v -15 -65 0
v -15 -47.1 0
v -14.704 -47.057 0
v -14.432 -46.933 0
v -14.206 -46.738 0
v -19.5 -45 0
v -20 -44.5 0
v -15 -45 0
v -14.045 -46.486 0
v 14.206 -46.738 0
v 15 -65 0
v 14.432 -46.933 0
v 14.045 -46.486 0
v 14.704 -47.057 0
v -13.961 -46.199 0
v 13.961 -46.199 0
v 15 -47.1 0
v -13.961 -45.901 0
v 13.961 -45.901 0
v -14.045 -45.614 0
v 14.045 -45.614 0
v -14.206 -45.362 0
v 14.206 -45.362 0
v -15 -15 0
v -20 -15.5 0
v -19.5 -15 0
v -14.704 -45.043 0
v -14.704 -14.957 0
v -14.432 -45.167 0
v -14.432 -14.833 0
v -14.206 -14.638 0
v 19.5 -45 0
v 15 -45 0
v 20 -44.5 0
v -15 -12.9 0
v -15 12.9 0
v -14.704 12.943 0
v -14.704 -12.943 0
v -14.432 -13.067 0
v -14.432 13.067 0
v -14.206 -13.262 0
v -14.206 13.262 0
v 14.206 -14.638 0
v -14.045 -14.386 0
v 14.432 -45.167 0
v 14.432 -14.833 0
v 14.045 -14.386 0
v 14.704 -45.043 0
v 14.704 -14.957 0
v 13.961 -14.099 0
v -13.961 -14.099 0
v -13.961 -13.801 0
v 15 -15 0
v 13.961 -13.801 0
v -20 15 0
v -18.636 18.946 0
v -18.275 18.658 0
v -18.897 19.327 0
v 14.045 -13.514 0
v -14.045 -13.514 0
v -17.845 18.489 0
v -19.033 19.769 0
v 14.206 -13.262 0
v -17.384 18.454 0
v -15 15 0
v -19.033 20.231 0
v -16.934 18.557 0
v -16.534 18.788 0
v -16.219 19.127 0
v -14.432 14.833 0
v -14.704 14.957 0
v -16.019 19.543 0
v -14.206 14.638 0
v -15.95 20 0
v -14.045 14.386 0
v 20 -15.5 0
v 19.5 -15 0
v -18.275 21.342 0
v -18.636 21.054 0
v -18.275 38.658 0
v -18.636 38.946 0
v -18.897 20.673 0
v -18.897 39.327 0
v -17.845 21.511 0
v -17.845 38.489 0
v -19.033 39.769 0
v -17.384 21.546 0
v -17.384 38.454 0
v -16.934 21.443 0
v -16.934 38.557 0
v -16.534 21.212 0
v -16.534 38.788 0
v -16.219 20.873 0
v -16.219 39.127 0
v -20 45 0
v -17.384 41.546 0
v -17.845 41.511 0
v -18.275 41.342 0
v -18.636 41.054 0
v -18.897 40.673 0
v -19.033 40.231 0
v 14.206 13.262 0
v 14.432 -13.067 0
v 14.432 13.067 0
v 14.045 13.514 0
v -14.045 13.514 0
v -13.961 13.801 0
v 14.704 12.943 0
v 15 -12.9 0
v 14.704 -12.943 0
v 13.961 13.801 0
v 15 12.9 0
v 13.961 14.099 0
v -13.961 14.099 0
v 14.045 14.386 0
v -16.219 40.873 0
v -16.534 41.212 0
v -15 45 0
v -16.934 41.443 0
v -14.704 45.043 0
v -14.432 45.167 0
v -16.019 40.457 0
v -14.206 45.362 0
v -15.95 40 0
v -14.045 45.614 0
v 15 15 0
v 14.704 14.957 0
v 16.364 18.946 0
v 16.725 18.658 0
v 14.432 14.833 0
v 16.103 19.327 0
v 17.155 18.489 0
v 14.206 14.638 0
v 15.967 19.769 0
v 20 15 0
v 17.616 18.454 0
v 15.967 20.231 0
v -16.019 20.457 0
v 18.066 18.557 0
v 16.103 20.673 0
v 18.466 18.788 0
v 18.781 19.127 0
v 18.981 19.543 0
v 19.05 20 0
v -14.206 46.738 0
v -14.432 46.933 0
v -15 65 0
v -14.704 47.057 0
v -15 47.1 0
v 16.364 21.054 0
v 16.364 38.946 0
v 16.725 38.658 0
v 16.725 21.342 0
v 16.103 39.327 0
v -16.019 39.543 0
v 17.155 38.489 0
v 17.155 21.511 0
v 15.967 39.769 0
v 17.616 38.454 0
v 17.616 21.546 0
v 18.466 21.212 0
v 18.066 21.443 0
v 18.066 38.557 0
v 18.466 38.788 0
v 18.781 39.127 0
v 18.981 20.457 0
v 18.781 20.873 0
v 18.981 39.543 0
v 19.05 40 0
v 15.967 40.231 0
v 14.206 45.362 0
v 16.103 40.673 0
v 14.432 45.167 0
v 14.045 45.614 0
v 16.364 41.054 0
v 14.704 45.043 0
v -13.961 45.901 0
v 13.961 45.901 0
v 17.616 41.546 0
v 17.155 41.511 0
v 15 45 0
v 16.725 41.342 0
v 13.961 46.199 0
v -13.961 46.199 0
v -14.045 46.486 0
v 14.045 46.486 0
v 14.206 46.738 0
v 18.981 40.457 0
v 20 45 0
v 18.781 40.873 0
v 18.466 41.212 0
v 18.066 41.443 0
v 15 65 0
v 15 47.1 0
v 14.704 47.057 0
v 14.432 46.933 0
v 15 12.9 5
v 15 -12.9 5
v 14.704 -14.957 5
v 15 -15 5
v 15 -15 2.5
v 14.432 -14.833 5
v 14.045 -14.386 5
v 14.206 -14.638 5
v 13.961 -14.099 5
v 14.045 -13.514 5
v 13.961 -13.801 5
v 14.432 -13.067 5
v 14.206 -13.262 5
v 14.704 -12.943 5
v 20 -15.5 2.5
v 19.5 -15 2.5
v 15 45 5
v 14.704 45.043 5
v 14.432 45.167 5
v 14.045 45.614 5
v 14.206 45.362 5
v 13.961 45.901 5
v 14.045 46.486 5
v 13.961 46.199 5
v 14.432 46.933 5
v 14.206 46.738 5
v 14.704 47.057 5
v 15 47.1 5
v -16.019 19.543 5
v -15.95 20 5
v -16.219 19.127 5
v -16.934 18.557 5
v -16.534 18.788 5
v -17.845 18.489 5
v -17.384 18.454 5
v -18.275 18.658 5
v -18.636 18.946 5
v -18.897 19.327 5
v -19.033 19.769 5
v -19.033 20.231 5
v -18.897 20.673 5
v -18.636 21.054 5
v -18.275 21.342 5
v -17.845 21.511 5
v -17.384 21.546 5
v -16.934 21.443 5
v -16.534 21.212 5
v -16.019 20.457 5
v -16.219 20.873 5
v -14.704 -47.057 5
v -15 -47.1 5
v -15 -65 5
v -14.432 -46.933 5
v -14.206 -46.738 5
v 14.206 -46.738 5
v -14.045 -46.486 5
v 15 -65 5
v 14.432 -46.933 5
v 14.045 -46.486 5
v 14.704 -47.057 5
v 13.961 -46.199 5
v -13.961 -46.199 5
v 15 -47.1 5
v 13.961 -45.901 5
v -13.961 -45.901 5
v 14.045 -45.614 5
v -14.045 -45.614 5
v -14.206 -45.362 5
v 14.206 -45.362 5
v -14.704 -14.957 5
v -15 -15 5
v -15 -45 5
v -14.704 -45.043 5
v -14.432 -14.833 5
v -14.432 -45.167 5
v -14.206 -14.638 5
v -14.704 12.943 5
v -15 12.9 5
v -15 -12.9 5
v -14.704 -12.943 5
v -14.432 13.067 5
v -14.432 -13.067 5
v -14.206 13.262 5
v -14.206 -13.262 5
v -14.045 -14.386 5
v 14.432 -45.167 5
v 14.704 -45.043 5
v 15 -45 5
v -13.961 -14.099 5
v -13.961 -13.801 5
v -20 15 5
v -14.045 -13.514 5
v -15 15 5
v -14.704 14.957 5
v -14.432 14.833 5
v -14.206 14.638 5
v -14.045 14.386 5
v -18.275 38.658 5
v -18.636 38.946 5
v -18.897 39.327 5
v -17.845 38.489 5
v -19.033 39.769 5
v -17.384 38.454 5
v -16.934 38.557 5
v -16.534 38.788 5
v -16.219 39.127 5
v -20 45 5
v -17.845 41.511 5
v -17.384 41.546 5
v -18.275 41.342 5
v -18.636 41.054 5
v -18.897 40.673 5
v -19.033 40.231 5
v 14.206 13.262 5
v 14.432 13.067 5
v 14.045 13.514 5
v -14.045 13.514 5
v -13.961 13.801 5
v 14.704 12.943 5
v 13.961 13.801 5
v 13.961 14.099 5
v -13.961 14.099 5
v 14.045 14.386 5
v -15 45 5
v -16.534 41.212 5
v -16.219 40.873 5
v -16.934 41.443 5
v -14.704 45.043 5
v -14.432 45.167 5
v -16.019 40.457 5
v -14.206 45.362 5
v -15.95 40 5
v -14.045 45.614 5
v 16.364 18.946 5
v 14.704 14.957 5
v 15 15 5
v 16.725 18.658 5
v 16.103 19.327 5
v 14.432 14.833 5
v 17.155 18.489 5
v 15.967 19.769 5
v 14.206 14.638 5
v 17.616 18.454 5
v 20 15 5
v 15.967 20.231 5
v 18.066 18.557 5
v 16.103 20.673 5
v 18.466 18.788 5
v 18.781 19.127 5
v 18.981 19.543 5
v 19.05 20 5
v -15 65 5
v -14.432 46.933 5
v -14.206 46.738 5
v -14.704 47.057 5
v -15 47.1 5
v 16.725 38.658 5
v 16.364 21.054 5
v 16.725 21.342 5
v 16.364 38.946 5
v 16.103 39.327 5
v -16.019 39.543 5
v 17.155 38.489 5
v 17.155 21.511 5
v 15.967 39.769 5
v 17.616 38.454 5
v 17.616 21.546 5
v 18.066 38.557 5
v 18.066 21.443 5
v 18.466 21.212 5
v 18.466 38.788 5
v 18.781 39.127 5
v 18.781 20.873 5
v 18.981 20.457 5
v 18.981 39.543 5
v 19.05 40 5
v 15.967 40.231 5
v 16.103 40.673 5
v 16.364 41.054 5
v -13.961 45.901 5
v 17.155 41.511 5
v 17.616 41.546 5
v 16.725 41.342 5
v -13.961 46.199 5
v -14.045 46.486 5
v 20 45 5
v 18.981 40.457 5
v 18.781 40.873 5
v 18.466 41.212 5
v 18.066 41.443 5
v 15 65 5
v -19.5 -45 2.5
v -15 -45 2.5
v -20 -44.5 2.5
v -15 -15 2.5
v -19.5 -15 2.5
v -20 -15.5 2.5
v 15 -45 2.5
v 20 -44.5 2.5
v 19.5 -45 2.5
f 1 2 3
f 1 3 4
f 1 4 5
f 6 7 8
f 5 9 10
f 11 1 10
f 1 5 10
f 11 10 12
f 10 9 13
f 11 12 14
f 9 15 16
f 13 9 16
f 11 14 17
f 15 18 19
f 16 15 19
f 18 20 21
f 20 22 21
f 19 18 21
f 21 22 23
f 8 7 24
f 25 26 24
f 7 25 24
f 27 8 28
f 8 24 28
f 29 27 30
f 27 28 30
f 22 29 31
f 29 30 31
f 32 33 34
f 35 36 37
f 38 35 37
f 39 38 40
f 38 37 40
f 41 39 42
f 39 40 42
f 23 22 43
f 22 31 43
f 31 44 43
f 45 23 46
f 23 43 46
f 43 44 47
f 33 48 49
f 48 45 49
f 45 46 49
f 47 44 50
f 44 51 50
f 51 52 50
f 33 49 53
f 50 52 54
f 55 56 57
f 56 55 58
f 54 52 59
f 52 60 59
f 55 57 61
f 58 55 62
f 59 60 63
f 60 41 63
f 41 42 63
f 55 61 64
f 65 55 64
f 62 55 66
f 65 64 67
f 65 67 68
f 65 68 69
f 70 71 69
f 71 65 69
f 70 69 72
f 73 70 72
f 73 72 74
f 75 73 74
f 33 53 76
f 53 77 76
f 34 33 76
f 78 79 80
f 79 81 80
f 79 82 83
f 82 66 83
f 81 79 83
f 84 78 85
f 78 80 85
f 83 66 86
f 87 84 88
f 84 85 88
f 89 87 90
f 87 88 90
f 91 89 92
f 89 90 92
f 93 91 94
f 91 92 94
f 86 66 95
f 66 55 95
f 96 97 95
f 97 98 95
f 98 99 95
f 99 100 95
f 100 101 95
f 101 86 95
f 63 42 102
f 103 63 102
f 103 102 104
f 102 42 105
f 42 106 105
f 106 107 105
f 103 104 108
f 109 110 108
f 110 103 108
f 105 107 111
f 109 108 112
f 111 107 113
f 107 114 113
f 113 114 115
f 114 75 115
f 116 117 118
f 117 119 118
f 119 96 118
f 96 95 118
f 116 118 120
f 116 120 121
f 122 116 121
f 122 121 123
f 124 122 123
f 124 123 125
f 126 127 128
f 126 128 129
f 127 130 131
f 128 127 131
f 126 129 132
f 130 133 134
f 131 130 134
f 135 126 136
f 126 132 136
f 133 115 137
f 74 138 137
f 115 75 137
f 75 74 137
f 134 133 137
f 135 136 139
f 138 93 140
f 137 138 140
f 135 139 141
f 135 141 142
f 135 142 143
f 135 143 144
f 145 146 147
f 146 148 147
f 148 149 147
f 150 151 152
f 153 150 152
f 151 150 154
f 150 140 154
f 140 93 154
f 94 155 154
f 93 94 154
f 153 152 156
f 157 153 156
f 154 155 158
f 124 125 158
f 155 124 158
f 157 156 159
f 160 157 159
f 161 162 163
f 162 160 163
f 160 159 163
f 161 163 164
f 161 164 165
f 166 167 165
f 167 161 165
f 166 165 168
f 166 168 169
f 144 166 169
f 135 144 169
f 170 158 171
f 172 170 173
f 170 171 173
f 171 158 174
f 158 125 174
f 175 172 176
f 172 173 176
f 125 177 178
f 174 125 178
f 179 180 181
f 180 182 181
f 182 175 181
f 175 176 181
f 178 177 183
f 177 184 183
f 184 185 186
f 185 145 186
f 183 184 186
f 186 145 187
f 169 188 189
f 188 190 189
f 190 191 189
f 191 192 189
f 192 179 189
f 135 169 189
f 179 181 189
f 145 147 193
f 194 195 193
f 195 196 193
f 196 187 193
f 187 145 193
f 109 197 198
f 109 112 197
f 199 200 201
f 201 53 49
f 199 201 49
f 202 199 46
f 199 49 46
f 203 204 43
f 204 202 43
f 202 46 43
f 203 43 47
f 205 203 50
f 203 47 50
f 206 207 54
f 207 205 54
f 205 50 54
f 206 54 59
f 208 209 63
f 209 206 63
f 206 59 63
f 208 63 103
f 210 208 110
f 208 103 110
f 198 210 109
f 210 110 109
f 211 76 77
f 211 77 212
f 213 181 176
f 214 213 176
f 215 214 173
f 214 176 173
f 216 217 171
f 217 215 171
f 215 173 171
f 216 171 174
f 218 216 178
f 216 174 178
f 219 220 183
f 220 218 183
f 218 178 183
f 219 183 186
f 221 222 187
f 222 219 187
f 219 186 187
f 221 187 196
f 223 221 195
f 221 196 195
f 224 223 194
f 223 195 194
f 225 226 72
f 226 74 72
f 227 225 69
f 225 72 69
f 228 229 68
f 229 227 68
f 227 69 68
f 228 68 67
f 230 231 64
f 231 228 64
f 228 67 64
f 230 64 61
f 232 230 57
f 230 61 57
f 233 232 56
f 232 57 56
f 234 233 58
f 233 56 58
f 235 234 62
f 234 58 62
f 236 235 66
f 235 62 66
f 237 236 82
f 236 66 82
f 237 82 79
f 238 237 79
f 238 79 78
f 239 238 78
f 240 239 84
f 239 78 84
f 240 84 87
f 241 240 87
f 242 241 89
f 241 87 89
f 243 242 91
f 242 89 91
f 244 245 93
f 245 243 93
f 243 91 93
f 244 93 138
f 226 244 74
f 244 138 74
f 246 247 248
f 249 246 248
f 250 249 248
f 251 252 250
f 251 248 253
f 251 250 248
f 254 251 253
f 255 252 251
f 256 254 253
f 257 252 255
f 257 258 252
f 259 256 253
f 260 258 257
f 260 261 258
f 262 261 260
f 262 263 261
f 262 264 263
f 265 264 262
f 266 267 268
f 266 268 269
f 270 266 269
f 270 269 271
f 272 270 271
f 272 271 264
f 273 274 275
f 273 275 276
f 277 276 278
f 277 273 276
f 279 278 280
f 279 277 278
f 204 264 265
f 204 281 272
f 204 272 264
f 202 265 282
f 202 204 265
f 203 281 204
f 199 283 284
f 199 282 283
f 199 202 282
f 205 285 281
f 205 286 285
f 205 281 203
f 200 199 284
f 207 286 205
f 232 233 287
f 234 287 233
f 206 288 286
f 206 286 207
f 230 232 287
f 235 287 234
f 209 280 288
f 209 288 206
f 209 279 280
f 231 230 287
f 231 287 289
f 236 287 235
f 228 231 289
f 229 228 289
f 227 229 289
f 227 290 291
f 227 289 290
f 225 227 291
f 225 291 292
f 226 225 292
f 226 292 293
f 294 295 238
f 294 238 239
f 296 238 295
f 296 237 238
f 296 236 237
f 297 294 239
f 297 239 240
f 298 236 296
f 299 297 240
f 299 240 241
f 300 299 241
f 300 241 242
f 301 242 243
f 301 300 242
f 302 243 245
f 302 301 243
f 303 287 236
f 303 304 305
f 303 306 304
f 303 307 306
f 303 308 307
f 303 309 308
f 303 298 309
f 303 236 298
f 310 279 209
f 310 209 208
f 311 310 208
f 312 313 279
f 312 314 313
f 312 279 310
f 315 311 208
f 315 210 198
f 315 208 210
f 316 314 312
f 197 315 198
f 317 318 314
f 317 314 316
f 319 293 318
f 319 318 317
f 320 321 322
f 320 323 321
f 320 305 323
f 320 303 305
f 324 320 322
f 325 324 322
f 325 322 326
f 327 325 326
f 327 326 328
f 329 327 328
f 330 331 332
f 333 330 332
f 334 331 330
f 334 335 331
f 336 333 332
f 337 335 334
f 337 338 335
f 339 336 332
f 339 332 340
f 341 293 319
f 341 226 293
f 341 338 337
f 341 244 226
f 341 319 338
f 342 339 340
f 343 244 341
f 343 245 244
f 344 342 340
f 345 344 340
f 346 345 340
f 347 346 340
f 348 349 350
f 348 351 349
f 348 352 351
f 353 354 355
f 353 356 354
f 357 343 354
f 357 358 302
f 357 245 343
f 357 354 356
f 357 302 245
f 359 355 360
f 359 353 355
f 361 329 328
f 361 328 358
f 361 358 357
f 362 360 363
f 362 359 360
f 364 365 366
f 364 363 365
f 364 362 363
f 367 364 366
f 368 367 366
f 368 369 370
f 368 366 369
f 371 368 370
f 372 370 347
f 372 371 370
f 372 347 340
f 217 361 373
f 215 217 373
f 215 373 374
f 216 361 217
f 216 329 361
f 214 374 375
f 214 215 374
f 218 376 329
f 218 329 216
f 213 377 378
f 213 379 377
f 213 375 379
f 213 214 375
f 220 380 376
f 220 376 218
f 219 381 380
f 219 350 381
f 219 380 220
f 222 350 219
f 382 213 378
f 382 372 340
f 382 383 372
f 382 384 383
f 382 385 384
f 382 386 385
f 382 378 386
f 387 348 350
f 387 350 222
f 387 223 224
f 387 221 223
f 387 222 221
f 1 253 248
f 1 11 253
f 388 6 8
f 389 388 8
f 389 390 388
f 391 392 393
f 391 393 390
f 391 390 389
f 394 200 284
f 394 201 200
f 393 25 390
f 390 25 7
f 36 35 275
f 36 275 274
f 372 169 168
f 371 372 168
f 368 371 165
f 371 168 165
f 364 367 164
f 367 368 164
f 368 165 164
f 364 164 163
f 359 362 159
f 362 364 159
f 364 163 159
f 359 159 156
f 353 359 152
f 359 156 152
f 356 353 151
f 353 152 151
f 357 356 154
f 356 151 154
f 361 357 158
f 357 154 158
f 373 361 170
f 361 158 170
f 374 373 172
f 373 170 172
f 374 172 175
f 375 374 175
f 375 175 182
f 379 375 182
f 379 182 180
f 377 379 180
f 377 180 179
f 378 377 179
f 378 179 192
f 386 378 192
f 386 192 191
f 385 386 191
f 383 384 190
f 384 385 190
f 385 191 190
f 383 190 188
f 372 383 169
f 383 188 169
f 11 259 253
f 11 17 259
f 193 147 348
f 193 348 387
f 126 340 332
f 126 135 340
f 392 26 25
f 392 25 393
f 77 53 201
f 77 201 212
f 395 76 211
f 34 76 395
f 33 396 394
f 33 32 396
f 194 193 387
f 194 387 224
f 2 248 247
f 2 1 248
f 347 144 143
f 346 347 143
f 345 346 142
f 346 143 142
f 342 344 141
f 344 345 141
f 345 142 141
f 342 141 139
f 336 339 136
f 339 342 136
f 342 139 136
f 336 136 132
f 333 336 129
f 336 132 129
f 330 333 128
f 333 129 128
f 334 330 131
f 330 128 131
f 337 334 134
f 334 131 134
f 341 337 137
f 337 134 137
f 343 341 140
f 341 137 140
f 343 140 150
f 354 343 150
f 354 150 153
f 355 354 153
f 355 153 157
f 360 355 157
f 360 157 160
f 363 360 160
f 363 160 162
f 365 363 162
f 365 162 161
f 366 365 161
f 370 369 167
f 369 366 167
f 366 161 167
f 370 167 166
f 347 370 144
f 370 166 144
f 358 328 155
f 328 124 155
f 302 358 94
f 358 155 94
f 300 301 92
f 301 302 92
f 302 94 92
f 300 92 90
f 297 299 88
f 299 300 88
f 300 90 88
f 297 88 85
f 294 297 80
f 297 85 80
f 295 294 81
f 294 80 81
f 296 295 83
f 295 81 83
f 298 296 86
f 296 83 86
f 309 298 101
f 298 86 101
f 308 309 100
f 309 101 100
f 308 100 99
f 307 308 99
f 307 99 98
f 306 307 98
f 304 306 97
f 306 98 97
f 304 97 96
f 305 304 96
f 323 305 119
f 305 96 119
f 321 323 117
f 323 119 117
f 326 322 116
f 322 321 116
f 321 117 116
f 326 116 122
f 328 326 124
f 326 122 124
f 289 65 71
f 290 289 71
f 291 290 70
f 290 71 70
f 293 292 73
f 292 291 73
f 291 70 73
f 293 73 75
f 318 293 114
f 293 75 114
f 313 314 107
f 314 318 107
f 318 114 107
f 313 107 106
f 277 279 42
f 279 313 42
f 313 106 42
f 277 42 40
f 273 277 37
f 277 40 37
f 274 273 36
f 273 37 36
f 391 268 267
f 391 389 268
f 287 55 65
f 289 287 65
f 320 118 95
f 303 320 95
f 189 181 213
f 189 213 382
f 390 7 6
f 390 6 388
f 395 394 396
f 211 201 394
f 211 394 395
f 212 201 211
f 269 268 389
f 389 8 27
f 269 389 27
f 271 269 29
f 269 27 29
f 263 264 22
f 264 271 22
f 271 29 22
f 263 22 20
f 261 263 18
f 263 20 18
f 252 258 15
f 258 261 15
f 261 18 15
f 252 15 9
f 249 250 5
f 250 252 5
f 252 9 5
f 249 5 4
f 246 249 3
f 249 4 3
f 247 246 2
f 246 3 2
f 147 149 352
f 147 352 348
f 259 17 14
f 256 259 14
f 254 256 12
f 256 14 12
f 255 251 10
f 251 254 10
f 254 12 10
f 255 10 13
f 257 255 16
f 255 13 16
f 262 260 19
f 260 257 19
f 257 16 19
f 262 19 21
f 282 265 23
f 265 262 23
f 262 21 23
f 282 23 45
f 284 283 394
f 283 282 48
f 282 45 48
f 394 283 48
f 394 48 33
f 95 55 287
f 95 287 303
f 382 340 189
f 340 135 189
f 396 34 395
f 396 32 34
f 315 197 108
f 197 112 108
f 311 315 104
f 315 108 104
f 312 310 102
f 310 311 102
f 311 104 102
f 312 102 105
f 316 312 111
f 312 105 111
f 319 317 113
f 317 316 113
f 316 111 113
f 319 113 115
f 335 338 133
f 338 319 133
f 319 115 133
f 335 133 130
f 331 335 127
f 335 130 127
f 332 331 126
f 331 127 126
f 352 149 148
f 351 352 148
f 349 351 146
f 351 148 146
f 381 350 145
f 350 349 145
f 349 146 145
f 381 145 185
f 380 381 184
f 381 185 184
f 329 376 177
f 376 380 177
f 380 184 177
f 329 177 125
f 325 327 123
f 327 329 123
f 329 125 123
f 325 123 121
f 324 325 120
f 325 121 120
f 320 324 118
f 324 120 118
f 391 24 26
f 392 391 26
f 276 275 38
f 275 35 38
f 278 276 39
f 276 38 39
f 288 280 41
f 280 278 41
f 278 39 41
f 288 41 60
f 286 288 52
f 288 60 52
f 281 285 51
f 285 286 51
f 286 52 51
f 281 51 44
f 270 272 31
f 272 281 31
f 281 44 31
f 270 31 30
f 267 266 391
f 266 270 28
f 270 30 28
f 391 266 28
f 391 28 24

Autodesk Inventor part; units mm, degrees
ref_plane "YZ Plane" through (0, 0, 0) normal (1, 0, 0) x (0, 1, 0)
ref_plane "XZ Plane" through (0, 0, 0) normal (0, 1, 0) x (-1, 0, 0)
ref_plane "XY Plane" through (0, 0, 0) normal (0, 0, 1) x (1, 0, 0)
sketch "スケッチ1" plane through (0, 0, 0) normal (0, 0, 1) x (1, 0, 0)
  line L0 (-15, 65) -> (15, 65)
  line L1 (15, 65) -> (15, 47.1)
  line L2 (15, -65) -> (-15, -65)
  line L3 (-15, -65) -> (-15, -47.1)
  line L4 (-15, 65) -> (15, -65) construction
  line L5 (15, 65) -> (-15, -65) construction
  line L6 (-15, 45) -> (-20, 45)
  line L7 (-20, 45) -> (-20, 45)
  line L8 (-20, 15) -> (-15, 15)
  line L9 (-20, 15) -> (-20, 45)
  line L10 (-15, -15) -> (-20, -15)
  line L11 (-20, -15) -> (-20, -45)
  line L12 (-20, -45) -> (-15, -45)
  arc A0 (-15, 45) -> (-15, 47.1) centre (-15, 46.05) ccw
  arc A1 (-15, 12.9) -> (-15, 15) centre (-15, 13.95) ccw
  arc A2 (-15, -15) -> (-15, -12.9) centre (-15, -13.95) ccw
  arc A3 (-15, -47.1) -> (-15, -45) centre (-15, -46.05) ccw
  line L13 (-15, 47.1) -> (-15, 65)
  line L14 (-15, 12.9) -> (-15, 47.1) construction
  line L15 (-15, -12.9) -> (-15, 12.9)
  line L16 (-15, -47.1) -> (-15, -45) construction
  line L17 (0, 65) -> (0, -65) construction
  line L18 (15, 45) -> (20, 45)
  line L19 (20, 15) -> (15, 15)
  line L20 (20, 15) -> (20, 45)
  line L21 (15, -15) -> (20, -15)
  line L22 (20, -15) -> (20, -45)
  line L23 (20, -45) -> (15, -45)
  arc A4 (15, 47.1) -> (15, 45) centre (15, 46.05) ccw
  arc A5 (15, 15) -> (15, 12.9) centre (15, 13.95) ccw
  arc A6 (15, -12.9) -> (15, -15) centre (15, -13.95) ccw
  arc A7 (15, -45) -> (15, -47.1) centre (15, -46.05) ccw
  line L24 (15, 47.1) -> (15, 12.9) construction
  line L25 (15, 12.9) -> (15, -12.9)
  line L26 (15, -47.1) -> (15, -65)
  line L27 (15, -12.9) -> (15, -15) construction
  circle A8 centre (-17.5, 40) radius 1.55
  circle A9 centre (-17.5, 20) radius 1.55
  circle A10 centre (17.5, 20) radius 1.55
  circle A11 centre (17.5, 40) radius 1.55
  line L28 (-15, -15) -> (-15, -12.9) construction
  line L29 (-15, -45) -> (-15, -15)
  line L30 (15, -15) -> (15, -45)
  line L31 (15, -45) -> (15, -47.1) construction
  point P0 (0, 0)
  dimension "d8" = 30
  dimension "d9" = 130
  dimension "d10" = 20
  dimension "d11" = 30
  dimension "d12" = 30
  dimension "d13" = 30
  dimension "d16" = 1.05
  dimension "d17" = 1.05
  dimension "d18" = 1.05
  dimension "d19" = 1.05
  dimension "d20" = 5
  dimension "d23" = 20
  dimension "d24" = 5
  dimension "d25" = 5
  dimension "d28" = 2.5
  dimension "d29" = 2.5
  dimension "d33" = 3.1
  dimension "d38" = 3.1
  dimension "d39" = 20
extrude "押し出し1" add sketch "スケッチ1" along normal blind 2.5
extrude "押し出し2" add sketch "スケッチ1" along normal blind 5 contours L0 L1 A4 L18 L20 L19 A5 L25 A6 L30 A7 L26 L2 L3 A3 L29 A2 L15 A1 L8 L9 L6 A0 L13
chamfer "面取り1" distance 0.5 angle 45 4 edges at (20, -15, 1.25) (20, -45, 1.25) (-20, -15, 1.25) (-20, -45, 1.25)
equation "\"d10\" = -0.5 * d12 + 0.5 * d9 - d11"
equation "\"d13\" = d11"
equation "\"d17\" = d16"
equation "\"d18\" = d17"
equation "\"d19\" = d18"
equation "\"d25\" = d24"
equation "\"d28\" = 0.5 * d20"
equation "\"d29\" = d28"
equation "\"d33\" = d38"
properties part number "Cockpit_lower_bottom_frame" material "アセタール樹脂、黒"
